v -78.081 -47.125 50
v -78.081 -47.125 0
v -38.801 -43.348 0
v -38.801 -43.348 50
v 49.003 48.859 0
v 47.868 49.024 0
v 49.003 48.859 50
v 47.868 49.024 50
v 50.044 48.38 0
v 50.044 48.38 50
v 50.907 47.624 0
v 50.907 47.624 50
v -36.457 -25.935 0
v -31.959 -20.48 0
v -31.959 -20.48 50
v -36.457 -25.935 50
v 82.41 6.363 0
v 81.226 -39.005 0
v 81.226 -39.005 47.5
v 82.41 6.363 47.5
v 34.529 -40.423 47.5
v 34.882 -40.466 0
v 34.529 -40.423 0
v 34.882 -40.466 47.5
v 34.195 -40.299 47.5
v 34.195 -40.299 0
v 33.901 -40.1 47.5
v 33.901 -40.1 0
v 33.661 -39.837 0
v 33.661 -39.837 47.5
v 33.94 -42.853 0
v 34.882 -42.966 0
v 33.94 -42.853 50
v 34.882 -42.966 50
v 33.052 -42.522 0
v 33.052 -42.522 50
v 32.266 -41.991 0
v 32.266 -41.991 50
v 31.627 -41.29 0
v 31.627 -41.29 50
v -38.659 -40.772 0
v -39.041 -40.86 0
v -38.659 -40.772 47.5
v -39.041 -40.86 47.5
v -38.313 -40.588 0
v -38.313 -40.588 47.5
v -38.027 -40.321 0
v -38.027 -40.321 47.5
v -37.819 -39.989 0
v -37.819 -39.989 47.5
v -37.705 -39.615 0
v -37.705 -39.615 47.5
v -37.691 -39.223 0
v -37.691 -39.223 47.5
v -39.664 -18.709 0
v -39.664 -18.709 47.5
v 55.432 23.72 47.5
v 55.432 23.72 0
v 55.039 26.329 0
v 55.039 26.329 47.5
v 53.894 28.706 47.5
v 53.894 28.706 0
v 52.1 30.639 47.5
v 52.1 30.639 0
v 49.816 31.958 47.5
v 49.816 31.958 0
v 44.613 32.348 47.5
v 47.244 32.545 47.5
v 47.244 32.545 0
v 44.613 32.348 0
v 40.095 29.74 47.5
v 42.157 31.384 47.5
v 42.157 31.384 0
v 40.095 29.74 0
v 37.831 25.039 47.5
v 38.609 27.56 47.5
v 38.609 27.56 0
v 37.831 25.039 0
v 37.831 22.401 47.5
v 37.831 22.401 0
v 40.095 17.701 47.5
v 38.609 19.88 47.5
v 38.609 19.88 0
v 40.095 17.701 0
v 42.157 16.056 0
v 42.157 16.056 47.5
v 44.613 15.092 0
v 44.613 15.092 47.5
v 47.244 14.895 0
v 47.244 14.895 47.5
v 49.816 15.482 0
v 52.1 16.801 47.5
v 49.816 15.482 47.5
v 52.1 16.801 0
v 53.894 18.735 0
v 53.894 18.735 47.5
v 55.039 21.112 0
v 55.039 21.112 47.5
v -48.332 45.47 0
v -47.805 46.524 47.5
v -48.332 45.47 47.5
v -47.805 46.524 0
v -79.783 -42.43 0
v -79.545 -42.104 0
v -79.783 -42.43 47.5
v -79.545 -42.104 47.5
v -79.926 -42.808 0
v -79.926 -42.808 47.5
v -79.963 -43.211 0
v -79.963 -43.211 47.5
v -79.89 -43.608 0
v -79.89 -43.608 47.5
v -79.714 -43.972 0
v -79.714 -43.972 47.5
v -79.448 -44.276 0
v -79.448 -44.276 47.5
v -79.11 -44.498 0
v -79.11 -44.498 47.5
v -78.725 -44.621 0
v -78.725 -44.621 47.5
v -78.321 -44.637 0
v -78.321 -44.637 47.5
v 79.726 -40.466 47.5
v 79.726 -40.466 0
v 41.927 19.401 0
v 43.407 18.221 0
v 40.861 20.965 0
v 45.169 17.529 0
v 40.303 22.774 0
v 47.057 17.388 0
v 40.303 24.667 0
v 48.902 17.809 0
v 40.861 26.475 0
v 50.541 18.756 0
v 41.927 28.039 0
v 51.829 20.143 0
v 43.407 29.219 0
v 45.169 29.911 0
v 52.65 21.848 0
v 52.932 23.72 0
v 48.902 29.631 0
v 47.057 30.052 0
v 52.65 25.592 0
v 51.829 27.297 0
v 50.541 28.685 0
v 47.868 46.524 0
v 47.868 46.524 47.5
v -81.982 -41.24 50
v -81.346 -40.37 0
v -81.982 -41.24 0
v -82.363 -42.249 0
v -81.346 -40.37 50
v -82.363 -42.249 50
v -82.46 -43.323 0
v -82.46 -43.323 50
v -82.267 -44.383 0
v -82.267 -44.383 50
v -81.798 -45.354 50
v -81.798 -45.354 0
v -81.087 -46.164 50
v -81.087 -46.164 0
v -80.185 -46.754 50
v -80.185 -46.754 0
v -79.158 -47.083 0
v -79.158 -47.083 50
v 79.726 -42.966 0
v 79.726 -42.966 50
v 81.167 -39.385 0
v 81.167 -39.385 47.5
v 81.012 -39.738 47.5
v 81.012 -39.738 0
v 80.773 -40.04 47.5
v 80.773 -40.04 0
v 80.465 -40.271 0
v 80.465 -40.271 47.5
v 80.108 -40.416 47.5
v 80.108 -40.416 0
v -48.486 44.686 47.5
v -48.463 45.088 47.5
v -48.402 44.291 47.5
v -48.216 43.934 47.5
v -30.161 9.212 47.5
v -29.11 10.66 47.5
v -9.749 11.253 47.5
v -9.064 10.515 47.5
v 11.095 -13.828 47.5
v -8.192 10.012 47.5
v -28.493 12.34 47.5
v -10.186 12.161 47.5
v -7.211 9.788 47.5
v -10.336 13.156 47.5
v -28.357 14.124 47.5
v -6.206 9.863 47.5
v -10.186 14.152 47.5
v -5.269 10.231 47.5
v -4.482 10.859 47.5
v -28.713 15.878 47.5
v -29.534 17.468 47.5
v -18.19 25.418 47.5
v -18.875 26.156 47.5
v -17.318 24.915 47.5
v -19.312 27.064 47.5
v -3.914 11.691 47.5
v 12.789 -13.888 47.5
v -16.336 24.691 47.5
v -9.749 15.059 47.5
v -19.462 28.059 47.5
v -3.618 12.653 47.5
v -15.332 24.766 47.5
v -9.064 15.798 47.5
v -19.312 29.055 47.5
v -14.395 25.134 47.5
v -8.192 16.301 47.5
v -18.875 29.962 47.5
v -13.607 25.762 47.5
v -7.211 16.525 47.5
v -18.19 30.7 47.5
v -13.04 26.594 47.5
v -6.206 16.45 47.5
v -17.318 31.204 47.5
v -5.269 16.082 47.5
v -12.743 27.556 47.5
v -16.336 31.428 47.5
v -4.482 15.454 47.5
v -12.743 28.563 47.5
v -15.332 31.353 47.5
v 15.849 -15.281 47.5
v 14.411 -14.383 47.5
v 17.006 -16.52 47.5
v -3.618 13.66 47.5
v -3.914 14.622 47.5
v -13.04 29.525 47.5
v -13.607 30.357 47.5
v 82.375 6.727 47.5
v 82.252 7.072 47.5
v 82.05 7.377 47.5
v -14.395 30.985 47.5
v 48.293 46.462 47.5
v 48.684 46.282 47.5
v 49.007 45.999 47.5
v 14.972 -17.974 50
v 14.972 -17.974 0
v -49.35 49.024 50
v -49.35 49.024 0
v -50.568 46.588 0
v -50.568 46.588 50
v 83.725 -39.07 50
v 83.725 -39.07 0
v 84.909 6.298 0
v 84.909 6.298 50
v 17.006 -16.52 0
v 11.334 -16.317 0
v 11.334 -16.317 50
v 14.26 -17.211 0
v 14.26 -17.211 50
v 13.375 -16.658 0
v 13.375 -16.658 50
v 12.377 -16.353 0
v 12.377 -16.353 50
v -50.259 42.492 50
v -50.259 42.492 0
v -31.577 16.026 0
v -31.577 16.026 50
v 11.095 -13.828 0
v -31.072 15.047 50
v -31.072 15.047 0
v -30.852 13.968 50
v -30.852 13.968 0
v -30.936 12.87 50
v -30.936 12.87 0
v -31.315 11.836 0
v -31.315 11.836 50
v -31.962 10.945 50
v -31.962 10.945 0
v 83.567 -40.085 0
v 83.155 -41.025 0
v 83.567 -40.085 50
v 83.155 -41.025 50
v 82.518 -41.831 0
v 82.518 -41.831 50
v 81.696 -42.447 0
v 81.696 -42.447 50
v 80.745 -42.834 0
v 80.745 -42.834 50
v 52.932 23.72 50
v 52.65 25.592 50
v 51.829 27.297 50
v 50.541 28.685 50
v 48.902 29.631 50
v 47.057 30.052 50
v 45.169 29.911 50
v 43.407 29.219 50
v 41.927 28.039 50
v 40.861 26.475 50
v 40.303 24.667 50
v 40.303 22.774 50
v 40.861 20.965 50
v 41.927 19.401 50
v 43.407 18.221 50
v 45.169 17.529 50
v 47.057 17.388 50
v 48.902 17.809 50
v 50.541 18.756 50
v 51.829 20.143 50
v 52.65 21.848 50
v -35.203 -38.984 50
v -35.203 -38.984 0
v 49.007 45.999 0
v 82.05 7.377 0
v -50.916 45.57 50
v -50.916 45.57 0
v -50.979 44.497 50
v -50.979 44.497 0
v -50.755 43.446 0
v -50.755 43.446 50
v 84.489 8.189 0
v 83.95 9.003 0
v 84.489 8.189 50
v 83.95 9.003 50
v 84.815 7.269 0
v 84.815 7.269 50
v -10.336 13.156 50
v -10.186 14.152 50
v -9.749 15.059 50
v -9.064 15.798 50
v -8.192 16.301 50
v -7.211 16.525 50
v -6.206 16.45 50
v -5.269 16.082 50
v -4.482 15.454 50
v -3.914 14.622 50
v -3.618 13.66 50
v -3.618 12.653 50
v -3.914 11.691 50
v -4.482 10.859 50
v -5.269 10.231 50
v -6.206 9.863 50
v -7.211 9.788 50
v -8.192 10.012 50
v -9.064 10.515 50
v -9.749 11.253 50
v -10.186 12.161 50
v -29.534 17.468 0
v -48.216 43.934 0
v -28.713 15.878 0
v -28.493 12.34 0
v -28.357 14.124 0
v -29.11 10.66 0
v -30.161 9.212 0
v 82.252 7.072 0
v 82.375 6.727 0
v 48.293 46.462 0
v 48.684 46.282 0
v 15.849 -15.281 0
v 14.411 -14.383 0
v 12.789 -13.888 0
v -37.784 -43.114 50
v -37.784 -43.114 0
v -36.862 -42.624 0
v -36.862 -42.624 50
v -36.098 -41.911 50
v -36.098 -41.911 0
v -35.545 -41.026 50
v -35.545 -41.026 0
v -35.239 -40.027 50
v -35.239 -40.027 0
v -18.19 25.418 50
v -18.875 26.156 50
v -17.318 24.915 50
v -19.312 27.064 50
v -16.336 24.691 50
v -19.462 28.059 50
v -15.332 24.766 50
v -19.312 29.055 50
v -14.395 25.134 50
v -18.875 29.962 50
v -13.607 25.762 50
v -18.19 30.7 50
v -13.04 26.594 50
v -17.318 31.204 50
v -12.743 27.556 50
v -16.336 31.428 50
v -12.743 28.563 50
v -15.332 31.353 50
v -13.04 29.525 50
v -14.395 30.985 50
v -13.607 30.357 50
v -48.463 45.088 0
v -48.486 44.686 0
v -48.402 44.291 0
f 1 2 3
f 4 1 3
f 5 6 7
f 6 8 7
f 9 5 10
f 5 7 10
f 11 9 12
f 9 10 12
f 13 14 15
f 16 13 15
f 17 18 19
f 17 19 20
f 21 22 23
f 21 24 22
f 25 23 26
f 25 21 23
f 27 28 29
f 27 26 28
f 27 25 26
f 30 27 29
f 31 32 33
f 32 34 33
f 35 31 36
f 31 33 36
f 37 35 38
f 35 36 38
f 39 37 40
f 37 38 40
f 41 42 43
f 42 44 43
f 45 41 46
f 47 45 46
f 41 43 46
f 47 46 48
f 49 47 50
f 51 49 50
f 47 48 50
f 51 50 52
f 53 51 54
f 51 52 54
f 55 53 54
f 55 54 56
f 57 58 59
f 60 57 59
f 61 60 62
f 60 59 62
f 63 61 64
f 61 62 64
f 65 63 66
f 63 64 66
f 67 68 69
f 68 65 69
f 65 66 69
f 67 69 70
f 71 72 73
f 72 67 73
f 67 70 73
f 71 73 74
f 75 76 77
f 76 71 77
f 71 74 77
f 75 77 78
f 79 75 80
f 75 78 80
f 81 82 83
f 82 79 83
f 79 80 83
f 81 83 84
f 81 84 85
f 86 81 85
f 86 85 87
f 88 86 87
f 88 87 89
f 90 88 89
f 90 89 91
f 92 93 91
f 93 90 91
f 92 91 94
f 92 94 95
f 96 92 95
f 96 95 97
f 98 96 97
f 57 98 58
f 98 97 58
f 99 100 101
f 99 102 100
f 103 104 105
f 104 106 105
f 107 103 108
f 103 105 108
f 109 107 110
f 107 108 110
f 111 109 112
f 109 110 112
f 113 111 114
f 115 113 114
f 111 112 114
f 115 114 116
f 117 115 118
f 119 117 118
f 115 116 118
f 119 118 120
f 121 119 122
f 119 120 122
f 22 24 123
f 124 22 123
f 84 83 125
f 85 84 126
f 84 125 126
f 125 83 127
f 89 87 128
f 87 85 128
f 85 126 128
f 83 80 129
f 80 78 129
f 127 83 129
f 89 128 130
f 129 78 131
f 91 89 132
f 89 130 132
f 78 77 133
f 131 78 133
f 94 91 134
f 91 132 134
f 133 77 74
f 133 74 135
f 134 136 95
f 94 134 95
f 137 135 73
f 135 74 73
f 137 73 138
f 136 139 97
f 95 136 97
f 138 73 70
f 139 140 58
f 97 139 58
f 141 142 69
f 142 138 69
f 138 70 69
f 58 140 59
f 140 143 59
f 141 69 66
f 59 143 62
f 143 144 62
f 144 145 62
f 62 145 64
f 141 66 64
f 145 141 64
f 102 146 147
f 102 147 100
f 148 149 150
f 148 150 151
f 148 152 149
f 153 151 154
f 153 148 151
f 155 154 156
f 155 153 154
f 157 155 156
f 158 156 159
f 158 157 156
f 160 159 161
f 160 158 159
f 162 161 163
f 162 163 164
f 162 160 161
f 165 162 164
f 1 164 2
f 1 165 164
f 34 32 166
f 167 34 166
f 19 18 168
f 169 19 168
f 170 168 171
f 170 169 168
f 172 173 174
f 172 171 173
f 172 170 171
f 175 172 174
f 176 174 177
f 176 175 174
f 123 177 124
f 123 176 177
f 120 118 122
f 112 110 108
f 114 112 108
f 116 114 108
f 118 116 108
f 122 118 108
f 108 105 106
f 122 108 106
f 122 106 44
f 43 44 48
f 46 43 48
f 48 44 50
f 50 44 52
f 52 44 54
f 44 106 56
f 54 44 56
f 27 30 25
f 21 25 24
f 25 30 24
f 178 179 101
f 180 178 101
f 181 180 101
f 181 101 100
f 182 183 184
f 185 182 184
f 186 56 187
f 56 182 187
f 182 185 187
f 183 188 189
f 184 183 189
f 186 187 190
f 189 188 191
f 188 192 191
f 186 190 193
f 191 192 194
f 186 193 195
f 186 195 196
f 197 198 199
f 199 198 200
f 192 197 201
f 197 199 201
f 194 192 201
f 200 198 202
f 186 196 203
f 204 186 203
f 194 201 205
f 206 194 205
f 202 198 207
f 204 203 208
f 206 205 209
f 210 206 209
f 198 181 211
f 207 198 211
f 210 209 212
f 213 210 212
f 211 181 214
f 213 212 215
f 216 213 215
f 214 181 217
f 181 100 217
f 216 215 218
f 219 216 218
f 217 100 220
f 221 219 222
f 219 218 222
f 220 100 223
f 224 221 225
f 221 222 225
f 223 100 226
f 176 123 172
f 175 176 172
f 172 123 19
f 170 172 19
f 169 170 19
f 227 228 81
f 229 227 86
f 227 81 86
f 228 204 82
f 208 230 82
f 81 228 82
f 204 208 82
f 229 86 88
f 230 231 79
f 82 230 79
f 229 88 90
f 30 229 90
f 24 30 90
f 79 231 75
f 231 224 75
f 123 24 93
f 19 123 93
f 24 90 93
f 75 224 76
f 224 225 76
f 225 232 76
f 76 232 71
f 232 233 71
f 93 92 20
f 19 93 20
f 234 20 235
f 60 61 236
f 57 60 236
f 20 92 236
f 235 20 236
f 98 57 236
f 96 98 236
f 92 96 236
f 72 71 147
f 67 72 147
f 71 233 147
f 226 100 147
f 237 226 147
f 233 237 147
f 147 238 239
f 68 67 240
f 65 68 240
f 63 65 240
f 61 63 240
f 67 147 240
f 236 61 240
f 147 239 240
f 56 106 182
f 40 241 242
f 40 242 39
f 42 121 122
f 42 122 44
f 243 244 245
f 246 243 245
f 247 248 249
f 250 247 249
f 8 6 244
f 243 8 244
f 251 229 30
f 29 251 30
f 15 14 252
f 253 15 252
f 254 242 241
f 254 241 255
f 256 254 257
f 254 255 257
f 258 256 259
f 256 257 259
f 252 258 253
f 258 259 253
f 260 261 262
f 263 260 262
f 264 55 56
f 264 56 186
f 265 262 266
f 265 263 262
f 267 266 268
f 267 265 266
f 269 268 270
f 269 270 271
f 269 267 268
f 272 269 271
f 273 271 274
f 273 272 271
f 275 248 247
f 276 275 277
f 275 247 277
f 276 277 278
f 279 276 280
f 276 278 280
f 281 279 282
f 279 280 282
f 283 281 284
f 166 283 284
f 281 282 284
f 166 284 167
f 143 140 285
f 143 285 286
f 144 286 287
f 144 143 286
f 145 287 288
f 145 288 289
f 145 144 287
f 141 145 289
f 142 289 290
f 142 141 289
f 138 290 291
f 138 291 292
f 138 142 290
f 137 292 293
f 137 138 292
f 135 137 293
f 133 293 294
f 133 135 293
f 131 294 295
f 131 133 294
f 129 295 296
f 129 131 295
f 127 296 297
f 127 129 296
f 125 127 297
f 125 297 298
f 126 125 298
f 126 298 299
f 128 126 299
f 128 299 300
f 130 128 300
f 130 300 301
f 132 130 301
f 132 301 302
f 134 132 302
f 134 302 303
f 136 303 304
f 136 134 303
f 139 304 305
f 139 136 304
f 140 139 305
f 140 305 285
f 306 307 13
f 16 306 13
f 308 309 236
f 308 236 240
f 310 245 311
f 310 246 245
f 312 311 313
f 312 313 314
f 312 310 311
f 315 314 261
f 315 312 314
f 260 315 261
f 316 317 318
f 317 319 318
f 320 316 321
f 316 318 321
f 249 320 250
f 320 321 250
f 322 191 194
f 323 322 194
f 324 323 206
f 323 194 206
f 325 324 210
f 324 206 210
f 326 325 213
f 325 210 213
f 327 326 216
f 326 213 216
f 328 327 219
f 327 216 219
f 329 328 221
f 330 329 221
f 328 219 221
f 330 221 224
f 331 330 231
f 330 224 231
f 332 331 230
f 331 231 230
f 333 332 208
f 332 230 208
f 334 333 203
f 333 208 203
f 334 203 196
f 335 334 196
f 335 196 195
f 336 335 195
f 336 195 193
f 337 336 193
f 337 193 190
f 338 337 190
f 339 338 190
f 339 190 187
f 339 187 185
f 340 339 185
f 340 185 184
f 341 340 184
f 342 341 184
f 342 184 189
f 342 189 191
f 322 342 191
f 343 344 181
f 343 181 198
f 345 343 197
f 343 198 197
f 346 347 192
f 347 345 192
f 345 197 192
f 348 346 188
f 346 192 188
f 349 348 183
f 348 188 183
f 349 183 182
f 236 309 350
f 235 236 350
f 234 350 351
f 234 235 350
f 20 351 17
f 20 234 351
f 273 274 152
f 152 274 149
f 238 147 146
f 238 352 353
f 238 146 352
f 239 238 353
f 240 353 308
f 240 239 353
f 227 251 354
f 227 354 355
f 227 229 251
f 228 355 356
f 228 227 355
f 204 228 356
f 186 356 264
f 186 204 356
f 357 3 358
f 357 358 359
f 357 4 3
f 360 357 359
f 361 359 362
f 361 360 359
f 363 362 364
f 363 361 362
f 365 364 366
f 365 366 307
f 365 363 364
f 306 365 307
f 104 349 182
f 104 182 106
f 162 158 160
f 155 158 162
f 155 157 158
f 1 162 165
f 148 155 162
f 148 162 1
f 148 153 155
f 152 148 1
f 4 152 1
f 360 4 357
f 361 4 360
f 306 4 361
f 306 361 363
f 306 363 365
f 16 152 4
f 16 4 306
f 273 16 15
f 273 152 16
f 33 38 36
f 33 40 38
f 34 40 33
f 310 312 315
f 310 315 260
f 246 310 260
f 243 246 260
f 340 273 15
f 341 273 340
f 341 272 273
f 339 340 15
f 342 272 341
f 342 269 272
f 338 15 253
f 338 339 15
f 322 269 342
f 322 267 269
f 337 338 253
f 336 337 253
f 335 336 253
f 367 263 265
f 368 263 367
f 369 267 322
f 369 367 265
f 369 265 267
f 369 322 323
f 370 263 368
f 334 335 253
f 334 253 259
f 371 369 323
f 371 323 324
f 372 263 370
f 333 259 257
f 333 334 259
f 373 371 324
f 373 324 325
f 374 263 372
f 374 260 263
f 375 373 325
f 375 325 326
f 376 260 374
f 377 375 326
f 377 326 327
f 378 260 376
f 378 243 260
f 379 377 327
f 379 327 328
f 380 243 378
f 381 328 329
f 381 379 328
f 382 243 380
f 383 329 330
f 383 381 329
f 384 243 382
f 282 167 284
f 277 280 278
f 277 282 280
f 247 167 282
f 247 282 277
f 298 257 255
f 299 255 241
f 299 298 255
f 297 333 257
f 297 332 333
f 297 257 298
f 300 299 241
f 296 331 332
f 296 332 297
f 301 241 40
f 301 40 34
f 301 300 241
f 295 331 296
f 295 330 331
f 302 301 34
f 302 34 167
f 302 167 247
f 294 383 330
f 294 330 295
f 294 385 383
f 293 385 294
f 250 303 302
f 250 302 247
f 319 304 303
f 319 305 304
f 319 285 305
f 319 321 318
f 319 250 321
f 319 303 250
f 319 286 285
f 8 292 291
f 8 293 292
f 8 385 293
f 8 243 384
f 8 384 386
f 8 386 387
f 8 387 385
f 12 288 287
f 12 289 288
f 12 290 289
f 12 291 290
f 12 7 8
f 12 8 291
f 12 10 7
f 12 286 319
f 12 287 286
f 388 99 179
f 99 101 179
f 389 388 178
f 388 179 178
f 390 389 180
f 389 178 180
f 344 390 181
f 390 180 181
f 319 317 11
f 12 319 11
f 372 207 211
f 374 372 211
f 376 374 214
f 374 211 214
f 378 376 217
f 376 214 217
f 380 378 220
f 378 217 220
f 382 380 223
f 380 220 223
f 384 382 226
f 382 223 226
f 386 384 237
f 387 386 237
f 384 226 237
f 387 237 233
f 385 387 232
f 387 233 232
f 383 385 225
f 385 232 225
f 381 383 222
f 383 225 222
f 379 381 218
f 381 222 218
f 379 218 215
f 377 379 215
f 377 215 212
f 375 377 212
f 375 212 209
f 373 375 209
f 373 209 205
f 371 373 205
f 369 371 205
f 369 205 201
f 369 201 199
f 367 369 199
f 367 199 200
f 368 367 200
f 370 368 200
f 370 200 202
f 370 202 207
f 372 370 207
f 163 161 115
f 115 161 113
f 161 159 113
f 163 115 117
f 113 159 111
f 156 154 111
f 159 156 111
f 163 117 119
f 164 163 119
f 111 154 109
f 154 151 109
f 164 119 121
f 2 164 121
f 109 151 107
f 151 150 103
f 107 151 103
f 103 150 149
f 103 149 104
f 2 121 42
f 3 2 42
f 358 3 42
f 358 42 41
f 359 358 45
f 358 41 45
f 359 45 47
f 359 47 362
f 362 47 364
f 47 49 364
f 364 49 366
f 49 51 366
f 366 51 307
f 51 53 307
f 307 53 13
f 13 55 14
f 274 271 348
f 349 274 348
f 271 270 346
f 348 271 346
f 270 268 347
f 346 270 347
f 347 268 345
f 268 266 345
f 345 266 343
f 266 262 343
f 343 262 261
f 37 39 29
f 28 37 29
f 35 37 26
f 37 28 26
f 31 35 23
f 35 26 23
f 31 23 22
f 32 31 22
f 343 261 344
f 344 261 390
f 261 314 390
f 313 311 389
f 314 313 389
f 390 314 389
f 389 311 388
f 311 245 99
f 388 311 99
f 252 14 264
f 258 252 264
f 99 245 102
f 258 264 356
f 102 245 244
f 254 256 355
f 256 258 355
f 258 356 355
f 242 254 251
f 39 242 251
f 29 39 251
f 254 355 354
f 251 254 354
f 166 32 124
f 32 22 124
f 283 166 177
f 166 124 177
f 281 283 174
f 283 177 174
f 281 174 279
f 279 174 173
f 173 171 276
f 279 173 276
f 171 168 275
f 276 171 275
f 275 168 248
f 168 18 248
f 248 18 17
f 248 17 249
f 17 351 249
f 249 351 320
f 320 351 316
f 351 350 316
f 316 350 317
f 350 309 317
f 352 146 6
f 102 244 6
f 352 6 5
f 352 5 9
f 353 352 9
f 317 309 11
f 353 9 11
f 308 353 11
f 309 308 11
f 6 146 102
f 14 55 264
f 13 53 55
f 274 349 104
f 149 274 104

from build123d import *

# Parameters (mm, degrees)
F0_R     = 6.35
F1_DEPTH = 50
F2_R     = 4
F3_T     = -2.5
F5_D     = 6.7564
F6_SIZE  = 5


with BuildPart() as f1:
    # F0 (on Top) → F1 (new body)
    with BuildSketch(Plane.XY):
        Polygon((49.709592275, 49.0236406618), (-49.350407725, 49.0236406618), (-51.6386922998, 44.4470657872), (-29.6711277494, 13.3263486253), (-88.8431668297, -48.1600951648), (-34.8197797575, -42.9655389343), (-36.9358653545, -20.9582477999), (13.6309133433, -16.0960577452), (32.8233957422, -42.9655389343), (83.6233957422, -42.9655389343), (84.9492279691, 7.8344567721), align=None)
        with Locations((46.5822630314, 23.7201556859)):
            Circle(F0_R, mode=Mode.SUBTRACT)
    extrude(amount=F1_DEPTH)

    # F2
    f2_edges = [f1.edges().sort_by_distance(p)[0] for p in [
        (84.949228, 7.834457, 25),
        (83.623396, -42.965539, 25),
        (-34.81978, -42.965539, 25),
        (32.823396, -42.965539, 25),
        (-88.843167, -48.160095, 25),
        (49.709592, 49.023641, 25),
        (-29.671128, 13.326349, 25),
        (-51.638692, 44.447066, 25),
        (13.630913, -16.096058, 25),
    ]]
    fillet(f2_edges, radius=F2_R)

    # F3
    f3_openings = [f1.faces().sort_by_distance(p)[0] for p in [
        (13.724729, 2.432943, 0),
    ]]
    offset(amount=F3_T, openings=f3_openings, kind=Kind.INTERSECTION)

    # F5 (through all)
    with Locations(Plane.XY.offset(50)):
        with Locations((-6.9581352872, 13.156432332), (-16.0837286401, 28.0593003633)):
            Hole(F5_D / 2)

    # F6
    f6_edges = [f1.edges().sort_by_distance(p)[0] for p in [
        (-36.935865, -20.958248, 25),
    ]]
    chamfer(f6_edges, length=F6_SIZE)


solid = f1.part
